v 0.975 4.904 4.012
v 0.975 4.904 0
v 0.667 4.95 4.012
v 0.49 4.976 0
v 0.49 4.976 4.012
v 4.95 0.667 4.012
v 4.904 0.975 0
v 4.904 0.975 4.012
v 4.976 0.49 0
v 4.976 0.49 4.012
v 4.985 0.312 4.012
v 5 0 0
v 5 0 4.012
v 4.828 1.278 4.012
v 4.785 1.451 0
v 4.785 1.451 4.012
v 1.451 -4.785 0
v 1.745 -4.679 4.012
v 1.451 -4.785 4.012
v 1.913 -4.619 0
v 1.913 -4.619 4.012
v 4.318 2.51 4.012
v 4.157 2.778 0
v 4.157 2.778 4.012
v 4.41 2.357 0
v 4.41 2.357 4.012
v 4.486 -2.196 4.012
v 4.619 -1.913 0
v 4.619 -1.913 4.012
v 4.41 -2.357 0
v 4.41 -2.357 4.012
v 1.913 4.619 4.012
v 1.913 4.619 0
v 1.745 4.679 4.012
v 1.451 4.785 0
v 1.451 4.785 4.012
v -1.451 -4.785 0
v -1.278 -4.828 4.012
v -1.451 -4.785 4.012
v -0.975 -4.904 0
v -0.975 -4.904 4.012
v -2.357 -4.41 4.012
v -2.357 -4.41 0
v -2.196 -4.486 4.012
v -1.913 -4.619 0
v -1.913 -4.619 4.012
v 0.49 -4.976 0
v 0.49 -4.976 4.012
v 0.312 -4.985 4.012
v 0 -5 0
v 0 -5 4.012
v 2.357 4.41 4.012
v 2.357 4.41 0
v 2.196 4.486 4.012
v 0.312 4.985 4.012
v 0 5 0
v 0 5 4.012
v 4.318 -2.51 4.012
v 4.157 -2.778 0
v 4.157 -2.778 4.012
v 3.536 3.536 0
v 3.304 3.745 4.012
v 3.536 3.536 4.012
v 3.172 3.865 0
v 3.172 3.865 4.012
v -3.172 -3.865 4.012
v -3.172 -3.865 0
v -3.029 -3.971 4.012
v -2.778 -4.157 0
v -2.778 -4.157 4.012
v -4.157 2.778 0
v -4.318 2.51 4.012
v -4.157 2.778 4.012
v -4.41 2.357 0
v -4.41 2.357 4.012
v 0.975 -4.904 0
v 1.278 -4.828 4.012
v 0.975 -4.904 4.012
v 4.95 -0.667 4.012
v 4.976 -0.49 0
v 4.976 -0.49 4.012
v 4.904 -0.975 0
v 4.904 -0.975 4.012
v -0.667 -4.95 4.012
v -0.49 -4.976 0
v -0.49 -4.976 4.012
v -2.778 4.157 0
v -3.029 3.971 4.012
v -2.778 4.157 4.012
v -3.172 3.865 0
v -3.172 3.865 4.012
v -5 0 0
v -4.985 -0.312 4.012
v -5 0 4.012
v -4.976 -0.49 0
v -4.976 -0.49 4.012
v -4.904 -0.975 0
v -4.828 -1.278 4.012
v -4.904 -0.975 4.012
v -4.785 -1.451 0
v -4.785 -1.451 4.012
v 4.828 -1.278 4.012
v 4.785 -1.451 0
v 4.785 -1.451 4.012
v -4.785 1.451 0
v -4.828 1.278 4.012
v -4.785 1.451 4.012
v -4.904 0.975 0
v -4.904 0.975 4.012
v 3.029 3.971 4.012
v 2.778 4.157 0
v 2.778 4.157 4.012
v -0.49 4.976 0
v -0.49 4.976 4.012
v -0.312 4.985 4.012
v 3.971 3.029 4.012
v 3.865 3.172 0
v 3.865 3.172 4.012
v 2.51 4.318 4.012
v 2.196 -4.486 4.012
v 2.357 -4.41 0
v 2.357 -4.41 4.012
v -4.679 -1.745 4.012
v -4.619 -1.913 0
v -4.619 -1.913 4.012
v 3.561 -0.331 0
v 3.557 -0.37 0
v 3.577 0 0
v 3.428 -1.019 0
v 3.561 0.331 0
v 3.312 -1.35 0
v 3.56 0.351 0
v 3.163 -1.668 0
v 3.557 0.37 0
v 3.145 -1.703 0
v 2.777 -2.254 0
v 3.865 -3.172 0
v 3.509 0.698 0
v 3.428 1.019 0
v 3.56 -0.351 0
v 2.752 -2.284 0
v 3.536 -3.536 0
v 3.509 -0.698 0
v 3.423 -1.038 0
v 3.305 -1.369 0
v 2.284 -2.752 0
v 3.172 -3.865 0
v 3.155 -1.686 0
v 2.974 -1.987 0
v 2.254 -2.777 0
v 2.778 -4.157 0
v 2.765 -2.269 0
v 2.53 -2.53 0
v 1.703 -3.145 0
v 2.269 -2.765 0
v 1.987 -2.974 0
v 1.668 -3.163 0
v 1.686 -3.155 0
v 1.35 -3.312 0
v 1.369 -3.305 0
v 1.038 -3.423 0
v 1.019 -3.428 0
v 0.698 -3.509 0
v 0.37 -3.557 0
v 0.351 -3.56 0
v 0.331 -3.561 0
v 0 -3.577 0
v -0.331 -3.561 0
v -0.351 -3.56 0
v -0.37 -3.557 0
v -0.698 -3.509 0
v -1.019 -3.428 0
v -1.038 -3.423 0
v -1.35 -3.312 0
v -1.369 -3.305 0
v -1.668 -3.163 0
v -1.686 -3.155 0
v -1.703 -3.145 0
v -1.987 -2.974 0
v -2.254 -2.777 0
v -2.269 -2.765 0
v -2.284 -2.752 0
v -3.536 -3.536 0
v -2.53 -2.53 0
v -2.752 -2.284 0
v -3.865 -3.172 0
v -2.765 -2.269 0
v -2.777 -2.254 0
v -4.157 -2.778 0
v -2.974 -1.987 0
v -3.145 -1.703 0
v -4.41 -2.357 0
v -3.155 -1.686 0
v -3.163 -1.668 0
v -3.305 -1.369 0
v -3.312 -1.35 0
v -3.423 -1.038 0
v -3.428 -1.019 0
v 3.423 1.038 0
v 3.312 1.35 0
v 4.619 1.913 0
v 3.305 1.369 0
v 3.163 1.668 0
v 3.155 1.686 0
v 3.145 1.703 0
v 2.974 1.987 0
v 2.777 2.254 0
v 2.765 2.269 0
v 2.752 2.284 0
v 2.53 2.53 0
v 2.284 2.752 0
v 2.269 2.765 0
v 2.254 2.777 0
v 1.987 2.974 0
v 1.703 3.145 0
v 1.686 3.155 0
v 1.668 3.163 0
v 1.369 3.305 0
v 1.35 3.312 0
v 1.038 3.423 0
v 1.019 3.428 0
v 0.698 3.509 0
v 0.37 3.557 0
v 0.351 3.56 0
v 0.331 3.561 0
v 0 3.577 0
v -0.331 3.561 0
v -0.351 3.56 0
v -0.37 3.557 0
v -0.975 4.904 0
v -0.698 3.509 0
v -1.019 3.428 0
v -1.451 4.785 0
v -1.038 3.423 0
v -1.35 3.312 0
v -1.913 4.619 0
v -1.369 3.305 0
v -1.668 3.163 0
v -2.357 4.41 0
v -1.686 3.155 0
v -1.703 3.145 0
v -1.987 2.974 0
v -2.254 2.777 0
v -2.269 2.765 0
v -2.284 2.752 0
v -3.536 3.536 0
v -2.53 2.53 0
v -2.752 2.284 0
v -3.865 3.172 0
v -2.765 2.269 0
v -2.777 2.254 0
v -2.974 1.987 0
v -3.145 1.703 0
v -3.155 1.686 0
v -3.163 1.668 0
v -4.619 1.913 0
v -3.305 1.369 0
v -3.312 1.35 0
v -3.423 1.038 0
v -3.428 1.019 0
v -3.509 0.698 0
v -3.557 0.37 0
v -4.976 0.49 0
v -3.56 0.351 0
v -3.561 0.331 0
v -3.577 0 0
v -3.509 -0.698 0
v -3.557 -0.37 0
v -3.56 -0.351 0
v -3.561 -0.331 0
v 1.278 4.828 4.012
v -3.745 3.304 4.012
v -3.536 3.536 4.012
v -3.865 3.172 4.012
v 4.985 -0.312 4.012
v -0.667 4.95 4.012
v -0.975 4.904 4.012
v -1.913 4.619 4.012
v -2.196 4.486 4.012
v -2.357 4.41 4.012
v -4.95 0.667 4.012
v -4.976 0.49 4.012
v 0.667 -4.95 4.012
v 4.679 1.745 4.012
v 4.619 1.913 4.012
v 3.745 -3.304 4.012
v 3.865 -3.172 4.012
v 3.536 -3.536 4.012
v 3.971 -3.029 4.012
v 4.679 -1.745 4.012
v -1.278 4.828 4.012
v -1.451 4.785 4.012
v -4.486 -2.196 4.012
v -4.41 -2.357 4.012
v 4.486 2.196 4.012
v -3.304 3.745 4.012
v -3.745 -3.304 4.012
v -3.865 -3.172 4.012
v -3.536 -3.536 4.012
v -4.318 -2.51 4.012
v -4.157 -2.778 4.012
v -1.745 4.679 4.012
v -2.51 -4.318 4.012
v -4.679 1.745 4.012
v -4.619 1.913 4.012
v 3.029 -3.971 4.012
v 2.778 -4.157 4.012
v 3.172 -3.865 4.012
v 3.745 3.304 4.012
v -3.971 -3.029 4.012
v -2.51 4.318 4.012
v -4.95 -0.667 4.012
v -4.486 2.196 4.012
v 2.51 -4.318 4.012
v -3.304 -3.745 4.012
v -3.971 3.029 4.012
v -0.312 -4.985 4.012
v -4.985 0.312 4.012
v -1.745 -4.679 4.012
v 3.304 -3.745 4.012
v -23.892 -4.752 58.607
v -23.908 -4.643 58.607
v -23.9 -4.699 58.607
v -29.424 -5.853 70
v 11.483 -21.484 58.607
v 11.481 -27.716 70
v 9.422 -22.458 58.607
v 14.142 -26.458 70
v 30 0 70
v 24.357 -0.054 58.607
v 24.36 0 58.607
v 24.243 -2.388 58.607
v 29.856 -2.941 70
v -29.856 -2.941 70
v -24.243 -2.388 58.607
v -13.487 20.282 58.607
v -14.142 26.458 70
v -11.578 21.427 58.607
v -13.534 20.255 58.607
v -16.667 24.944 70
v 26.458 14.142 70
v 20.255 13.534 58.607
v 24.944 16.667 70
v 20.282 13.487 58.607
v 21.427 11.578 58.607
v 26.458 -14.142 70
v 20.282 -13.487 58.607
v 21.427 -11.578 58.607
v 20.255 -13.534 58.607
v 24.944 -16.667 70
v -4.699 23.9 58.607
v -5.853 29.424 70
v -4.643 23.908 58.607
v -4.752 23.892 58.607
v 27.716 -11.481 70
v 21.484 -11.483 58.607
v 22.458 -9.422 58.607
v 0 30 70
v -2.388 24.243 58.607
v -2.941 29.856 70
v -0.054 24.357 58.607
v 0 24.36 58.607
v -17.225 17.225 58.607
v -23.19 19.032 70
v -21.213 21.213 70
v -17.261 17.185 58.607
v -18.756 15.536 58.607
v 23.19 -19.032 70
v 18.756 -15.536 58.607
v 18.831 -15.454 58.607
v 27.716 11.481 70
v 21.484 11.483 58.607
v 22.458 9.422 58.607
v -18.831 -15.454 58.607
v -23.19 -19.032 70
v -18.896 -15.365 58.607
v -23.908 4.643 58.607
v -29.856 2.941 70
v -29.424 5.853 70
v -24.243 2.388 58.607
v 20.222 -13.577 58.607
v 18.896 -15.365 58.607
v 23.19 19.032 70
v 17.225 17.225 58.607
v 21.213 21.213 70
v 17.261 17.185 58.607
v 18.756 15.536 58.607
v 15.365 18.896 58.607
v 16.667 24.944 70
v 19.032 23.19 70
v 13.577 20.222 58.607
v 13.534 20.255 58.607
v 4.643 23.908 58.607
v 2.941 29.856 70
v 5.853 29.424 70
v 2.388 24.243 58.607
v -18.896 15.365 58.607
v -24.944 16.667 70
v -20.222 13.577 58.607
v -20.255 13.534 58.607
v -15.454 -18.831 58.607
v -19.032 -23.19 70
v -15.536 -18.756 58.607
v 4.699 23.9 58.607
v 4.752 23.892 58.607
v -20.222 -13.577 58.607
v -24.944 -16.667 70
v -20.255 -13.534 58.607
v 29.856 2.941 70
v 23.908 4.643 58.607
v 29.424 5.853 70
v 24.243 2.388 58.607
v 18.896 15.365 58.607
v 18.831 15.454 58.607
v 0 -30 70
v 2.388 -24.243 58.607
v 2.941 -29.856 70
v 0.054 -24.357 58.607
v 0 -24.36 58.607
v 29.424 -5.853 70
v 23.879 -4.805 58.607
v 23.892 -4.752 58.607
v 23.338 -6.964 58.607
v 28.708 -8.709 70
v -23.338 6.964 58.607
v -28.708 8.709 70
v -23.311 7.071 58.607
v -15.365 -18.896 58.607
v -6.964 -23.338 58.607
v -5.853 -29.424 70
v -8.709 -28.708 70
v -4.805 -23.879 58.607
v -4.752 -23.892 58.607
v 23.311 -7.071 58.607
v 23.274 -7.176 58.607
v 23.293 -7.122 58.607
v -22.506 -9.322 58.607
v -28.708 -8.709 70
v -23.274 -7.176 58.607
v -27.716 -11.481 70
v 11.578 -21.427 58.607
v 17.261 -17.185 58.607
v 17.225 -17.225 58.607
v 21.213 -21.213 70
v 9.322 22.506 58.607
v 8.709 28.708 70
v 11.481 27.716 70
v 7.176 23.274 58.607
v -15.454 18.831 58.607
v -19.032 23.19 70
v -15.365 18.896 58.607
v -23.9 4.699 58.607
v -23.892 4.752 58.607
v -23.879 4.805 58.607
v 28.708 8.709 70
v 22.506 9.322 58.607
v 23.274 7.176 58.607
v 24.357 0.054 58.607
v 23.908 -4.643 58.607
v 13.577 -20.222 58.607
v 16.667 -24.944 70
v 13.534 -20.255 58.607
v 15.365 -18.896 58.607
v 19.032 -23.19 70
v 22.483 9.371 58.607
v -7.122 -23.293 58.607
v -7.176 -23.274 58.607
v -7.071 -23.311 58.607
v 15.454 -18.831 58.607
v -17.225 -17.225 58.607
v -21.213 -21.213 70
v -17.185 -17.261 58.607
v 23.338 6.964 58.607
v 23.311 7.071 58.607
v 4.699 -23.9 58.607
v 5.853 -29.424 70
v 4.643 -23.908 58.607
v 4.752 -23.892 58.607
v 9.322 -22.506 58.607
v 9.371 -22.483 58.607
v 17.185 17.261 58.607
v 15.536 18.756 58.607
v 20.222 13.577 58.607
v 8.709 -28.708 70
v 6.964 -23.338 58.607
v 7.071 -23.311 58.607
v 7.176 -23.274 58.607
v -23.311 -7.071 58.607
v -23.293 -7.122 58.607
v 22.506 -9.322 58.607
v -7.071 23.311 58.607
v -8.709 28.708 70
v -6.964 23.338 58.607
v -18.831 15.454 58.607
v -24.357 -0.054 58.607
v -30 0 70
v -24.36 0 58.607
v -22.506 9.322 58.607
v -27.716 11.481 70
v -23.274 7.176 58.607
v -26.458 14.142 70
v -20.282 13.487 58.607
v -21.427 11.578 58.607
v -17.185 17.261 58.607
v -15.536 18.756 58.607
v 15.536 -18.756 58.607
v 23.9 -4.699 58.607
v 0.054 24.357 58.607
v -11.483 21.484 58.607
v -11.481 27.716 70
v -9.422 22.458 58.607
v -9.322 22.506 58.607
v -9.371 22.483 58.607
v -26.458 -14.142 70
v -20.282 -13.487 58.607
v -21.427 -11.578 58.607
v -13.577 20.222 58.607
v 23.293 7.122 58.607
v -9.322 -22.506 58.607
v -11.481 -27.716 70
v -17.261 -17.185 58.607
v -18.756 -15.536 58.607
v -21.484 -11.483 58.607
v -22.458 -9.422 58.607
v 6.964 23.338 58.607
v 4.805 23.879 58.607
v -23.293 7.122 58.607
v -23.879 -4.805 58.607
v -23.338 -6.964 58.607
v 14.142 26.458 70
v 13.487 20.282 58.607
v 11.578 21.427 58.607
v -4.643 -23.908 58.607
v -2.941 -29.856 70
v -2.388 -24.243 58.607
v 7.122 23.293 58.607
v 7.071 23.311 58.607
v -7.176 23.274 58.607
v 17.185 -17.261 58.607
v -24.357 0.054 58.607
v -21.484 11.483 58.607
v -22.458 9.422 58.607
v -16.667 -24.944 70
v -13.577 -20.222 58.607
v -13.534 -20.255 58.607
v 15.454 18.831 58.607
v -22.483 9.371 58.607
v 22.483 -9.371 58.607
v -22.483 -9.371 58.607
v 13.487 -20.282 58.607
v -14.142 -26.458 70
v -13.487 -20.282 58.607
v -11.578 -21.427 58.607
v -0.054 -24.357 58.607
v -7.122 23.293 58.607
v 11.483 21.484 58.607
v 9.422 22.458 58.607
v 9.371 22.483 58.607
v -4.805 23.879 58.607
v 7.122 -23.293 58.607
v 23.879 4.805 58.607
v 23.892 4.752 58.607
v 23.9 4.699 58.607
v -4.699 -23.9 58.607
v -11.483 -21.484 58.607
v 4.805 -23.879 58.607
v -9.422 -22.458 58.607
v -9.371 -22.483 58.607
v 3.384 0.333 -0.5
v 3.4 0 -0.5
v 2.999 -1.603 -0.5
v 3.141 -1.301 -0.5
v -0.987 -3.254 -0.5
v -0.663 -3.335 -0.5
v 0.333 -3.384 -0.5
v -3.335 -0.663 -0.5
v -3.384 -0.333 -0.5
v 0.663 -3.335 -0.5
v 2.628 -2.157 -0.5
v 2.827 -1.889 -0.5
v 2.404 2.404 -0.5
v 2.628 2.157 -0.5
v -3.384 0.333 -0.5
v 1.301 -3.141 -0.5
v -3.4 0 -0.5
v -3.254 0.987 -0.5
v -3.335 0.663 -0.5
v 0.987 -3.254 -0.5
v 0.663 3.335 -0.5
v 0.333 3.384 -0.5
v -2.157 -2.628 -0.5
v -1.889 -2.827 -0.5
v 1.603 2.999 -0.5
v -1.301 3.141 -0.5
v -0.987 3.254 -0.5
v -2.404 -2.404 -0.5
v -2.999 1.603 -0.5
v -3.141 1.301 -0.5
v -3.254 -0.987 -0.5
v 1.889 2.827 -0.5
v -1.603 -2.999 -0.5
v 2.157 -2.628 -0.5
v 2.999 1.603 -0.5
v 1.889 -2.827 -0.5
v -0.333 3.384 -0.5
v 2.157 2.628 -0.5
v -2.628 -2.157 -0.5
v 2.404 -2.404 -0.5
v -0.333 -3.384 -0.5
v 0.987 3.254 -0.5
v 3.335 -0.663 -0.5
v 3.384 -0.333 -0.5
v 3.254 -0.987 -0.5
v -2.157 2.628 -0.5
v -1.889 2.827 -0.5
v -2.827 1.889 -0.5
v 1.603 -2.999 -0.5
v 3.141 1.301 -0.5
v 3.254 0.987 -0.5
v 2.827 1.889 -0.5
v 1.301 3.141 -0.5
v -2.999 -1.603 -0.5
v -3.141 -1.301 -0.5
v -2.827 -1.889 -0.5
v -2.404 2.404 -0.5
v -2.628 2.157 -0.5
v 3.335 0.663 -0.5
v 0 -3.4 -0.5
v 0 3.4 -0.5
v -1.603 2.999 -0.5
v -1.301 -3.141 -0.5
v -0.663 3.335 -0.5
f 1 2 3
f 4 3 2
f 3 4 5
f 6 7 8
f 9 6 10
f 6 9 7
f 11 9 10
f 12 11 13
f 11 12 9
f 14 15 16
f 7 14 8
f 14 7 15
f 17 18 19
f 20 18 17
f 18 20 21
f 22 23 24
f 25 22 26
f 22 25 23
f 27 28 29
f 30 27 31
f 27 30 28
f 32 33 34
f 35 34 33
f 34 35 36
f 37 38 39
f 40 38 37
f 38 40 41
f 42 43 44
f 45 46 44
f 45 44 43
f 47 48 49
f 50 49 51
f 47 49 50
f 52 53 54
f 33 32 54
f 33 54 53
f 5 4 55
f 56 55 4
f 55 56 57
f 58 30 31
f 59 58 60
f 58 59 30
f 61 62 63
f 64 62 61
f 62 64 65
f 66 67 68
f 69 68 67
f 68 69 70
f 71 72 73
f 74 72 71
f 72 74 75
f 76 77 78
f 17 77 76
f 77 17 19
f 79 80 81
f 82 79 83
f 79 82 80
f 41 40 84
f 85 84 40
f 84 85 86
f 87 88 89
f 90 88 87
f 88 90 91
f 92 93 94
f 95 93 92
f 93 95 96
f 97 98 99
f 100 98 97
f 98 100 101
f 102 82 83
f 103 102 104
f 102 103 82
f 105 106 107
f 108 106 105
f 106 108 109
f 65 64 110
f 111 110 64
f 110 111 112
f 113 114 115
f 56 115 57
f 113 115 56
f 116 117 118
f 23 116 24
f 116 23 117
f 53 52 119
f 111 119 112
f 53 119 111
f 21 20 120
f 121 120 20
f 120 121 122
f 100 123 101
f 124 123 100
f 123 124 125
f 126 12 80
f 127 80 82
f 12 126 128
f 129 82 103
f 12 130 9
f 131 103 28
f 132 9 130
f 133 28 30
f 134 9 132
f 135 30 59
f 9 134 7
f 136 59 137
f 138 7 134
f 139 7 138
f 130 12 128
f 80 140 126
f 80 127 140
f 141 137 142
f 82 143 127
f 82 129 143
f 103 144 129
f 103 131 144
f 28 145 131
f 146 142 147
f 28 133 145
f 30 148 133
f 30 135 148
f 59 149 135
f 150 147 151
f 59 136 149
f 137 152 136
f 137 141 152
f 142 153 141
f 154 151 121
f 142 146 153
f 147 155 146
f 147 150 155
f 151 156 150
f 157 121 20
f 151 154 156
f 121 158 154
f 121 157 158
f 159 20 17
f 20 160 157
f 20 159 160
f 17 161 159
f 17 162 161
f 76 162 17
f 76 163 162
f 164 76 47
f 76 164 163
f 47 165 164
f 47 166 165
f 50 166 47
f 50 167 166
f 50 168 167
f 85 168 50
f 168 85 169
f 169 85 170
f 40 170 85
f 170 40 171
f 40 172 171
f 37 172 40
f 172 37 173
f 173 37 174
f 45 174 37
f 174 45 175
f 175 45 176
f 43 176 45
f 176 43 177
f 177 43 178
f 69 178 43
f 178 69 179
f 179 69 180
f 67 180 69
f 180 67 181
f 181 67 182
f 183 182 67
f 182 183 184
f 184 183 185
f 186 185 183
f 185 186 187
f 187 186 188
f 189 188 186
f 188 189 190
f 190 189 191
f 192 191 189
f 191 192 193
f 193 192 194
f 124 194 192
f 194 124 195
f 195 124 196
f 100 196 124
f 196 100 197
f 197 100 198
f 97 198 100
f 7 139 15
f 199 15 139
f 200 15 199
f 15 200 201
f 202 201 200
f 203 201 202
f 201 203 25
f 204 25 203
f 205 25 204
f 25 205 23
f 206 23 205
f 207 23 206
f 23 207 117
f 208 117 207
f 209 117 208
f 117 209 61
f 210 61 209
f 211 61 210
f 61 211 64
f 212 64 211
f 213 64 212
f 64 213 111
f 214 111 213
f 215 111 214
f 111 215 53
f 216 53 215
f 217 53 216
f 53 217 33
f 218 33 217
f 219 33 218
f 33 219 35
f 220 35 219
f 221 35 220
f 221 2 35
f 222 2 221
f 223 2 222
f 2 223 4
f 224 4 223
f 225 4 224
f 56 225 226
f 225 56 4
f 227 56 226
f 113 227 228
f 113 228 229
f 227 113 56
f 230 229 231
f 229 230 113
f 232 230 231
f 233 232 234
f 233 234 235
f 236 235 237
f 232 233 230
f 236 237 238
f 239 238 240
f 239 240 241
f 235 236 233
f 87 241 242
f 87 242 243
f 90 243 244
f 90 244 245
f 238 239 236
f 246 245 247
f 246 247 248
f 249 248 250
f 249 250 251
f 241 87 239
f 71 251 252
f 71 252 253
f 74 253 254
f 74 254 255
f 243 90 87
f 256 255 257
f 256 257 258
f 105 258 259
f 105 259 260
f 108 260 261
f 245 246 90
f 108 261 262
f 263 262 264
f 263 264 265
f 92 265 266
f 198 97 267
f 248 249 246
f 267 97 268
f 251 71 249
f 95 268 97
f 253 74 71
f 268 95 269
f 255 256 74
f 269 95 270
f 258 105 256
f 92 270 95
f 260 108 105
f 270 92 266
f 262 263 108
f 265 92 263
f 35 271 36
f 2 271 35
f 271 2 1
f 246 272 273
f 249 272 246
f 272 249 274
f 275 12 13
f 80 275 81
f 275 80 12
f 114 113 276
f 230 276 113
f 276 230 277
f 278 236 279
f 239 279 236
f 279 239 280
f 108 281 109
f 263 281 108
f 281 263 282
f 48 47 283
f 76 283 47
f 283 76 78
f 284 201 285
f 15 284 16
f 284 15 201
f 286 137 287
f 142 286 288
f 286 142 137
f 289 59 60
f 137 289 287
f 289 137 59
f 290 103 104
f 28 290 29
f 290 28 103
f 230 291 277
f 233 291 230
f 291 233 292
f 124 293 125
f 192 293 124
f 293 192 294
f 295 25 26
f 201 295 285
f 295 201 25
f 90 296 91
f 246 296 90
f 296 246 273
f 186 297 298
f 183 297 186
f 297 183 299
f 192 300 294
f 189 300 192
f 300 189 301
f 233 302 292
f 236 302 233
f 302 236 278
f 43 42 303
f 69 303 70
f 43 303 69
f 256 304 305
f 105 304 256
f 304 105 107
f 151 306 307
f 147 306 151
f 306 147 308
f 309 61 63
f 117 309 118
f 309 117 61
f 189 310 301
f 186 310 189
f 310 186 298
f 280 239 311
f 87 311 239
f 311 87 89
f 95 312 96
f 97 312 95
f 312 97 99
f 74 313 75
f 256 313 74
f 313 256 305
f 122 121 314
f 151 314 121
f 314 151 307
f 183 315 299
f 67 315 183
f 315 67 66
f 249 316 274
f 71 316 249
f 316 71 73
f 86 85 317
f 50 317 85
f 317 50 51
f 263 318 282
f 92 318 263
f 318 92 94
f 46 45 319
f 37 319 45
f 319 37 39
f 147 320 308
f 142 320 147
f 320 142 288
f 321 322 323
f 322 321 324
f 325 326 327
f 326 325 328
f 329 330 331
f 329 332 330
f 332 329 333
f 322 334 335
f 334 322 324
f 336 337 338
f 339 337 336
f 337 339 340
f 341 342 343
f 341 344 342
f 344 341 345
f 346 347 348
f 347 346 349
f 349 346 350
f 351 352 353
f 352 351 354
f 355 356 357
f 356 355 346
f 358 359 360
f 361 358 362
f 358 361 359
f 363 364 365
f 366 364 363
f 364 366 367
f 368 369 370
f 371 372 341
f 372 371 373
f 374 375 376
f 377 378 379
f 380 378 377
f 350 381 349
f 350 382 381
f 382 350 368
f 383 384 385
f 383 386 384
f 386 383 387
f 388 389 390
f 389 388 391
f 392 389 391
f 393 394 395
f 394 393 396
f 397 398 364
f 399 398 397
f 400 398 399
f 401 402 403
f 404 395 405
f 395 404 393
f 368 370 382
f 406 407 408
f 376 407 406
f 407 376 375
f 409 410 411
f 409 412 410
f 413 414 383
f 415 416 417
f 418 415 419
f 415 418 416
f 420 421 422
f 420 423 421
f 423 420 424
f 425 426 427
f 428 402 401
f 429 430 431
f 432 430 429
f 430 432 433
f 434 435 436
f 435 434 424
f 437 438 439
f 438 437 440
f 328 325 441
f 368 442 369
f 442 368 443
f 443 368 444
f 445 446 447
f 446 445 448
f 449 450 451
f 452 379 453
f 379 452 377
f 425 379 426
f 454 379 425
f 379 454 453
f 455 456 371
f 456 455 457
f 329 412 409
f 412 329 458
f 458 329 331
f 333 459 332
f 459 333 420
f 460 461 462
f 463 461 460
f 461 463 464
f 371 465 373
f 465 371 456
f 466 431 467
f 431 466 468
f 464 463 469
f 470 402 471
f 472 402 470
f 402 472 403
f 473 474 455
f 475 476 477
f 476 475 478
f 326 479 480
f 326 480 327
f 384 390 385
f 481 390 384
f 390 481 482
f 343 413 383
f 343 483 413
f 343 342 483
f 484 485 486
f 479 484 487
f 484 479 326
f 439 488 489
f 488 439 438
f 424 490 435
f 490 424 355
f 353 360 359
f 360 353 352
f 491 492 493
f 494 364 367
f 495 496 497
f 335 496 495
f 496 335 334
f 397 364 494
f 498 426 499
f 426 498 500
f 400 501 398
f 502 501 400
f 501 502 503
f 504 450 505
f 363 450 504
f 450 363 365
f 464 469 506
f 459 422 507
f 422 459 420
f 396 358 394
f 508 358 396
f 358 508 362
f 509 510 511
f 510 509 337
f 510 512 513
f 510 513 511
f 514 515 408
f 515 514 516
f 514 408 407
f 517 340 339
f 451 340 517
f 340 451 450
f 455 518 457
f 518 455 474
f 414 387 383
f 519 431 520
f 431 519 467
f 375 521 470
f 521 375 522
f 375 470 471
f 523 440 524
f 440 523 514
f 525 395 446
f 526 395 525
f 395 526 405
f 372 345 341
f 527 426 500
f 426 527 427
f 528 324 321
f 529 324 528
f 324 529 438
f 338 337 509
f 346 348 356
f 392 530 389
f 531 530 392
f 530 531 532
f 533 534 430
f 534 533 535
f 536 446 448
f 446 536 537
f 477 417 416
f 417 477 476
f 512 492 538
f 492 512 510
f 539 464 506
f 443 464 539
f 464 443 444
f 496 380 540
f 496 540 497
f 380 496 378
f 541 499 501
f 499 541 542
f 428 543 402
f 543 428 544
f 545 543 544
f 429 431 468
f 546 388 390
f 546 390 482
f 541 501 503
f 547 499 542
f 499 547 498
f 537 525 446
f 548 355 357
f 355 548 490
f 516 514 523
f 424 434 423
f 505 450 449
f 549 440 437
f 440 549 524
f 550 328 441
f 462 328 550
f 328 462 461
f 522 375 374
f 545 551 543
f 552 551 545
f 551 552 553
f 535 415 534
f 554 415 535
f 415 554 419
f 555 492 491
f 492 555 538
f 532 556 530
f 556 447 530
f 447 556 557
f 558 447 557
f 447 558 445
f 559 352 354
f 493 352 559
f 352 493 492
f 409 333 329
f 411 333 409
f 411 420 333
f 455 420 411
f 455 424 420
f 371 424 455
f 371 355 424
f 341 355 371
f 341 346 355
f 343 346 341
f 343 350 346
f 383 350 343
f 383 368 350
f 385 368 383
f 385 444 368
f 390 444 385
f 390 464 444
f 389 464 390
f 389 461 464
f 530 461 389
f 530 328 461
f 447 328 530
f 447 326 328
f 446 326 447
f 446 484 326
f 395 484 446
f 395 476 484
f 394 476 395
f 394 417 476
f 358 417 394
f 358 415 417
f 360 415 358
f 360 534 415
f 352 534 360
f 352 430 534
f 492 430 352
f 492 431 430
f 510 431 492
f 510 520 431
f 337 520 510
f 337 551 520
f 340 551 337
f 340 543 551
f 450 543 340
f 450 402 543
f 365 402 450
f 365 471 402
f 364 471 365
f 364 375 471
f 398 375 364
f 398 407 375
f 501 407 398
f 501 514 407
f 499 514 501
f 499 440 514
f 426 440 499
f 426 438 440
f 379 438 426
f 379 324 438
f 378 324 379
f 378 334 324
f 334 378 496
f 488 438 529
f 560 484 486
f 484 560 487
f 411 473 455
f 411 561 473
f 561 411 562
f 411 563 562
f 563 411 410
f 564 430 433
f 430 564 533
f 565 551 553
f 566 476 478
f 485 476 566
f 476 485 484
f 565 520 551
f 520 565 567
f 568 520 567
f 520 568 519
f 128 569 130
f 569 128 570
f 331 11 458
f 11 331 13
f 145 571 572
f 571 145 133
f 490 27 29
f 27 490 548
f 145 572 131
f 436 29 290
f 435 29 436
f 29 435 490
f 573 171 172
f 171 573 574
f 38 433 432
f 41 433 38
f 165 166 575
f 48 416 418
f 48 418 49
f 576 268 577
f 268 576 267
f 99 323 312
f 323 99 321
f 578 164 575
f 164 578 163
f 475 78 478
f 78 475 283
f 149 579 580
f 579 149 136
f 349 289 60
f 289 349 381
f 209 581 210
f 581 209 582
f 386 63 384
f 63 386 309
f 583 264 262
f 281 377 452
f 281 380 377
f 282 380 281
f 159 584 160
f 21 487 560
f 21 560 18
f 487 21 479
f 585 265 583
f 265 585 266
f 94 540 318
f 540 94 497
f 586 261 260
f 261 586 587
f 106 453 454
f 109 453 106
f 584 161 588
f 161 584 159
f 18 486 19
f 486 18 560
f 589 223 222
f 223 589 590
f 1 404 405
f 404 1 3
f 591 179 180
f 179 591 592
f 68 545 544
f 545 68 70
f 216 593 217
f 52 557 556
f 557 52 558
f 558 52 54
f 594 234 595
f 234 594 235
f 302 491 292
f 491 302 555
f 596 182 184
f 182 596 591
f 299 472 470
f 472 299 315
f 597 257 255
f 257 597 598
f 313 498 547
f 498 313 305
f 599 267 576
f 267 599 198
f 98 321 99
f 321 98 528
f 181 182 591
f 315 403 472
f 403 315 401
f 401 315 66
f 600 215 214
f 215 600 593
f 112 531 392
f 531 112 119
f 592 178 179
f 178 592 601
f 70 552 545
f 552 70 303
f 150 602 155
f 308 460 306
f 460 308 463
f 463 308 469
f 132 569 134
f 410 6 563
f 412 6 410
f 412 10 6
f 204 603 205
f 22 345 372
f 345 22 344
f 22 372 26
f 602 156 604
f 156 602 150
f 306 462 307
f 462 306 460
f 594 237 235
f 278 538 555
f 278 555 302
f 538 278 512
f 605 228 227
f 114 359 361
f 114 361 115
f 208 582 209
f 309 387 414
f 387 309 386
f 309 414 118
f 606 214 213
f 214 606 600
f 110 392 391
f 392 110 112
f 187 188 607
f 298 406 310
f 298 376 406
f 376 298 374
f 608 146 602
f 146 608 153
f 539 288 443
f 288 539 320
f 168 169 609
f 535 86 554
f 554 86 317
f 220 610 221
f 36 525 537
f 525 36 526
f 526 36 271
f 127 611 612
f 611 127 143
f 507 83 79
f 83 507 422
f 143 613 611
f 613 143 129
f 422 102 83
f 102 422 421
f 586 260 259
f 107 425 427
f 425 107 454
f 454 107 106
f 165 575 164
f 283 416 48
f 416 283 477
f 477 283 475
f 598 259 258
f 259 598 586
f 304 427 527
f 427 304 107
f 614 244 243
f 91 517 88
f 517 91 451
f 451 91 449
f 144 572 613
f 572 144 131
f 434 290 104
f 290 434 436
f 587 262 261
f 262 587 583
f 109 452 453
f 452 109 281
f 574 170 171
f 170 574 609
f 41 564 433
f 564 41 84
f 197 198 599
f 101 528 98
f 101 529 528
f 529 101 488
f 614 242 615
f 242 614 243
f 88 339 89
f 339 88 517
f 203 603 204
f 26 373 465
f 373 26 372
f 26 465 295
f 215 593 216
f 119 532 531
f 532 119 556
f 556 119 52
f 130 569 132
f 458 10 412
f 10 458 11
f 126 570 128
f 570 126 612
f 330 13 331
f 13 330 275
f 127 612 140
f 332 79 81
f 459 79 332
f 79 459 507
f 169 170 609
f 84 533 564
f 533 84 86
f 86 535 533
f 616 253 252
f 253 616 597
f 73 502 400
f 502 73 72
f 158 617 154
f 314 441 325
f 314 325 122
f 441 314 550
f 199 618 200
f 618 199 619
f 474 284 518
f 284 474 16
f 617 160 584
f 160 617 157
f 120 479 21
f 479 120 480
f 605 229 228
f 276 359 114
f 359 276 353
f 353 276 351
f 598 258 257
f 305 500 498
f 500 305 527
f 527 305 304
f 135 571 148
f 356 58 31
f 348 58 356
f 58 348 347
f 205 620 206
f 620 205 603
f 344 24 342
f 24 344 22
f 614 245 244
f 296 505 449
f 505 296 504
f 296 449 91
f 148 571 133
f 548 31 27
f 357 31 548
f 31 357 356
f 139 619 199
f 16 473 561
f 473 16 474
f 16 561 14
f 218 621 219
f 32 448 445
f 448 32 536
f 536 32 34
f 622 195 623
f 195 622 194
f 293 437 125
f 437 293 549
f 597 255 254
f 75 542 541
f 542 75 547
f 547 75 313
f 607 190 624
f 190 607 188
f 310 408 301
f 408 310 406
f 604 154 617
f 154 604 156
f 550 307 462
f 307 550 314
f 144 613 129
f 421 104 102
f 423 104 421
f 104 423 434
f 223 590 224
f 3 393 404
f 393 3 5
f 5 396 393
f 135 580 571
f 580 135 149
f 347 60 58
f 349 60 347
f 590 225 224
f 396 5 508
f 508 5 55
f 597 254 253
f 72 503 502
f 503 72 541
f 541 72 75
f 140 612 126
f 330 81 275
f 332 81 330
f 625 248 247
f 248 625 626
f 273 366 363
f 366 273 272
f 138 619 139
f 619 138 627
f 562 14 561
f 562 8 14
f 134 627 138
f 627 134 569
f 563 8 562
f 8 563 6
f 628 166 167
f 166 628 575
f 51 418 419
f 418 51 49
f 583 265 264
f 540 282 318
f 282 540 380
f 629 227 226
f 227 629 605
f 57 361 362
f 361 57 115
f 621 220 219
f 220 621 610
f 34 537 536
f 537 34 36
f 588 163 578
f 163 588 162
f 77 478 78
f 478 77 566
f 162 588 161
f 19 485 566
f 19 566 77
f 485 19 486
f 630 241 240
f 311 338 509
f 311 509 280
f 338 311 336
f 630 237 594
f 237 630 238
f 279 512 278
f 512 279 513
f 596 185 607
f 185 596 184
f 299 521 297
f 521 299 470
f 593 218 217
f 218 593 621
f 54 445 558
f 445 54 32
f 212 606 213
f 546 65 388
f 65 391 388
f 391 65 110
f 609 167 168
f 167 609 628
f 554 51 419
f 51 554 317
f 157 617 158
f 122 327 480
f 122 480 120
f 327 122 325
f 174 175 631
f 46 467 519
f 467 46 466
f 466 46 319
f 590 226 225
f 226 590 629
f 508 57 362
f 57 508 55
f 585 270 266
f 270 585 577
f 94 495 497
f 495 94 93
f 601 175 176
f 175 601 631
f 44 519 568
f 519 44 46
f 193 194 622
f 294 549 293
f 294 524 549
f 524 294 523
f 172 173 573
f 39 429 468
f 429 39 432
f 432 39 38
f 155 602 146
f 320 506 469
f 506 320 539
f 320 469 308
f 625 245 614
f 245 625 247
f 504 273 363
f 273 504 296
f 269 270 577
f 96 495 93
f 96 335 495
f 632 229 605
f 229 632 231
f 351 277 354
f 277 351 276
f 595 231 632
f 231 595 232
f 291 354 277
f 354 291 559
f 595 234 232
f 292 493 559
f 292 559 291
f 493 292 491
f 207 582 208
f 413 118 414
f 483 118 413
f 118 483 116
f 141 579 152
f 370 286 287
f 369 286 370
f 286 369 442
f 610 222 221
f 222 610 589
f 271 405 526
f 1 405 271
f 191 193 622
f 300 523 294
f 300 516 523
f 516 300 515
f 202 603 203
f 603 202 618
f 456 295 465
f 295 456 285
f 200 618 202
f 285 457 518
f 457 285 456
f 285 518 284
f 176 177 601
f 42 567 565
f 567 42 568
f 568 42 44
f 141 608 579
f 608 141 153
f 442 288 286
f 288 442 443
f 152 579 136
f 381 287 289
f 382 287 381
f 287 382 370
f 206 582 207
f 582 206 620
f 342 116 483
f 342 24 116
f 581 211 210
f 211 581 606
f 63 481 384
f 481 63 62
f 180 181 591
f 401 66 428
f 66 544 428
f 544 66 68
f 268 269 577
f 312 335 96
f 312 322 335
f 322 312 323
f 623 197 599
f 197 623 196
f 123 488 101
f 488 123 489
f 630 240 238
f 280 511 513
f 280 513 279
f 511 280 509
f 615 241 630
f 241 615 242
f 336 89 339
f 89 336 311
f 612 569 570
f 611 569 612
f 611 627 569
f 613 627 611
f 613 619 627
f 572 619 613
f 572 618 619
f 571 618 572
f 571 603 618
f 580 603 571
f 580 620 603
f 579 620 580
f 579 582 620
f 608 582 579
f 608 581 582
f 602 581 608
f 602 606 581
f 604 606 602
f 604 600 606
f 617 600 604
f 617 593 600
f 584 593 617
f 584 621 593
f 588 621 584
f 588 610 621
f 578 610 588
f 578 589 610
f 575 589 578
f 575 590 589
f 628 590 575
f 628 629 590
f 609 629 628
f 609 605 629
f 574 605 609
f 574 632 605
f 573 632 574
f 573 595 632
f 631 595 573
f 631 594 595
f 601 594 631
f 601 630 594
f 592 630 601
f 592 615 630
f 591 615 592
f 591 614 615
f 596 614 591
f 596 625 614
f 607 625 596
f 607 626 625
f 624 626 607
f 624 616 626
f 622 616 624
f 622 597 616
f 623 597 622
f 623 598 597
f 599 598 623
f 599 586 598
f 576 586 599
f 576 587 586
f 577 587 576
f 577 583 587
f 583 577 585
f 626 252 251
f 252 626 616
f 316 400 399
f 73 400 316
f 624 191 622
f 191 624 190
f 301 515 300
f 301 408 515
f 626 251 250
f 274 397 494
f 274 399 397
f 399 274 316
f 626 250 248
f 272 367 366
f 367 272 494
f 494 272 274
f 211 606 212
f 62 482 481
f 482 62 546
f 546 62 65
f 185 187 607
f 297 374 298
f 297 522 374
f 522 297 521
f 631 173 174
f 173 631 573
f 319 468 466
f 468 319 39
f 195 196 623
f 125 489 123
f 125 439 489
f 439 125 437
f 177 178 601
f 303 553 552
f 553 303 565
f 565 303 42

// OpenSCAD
// Small lab funnel, printed upright with wide opening at top
// Units: mm

$fn = 64;

// --- Dimensions ---
spout_od      = 10;    // spout outer diameter
spout_id      = spout_od - 2 * 1.6;  // spout bore (6.8)
spout_h       = 20;    // spout height (z = 0 to 20)
cone_top_d    = 10;    // cone diameter at spout junction (z = 20)
cone_rim_d    = 60;    // cone rim diameter (z = 50)
cone_h        = cone_rim_d - cone_top_d; // cone height (30)
wall          = 1.6;   // uniform wall thickness
eps           = 0.5;   // overlap / cut overshoot

// --- Model ---
union() {
    // Spout
    translate([0, 0, 0])
        cylinder(d = spout_od, h = spout_h);
    // Cone (overlaps spout by eps for a clean union)
    translate([0, 0, spout_h - eps])
        cylinder(d1 = cone_top_d, d2 = cone_rim_d, h = cone_h + eps);
}
difference() {
    // Through-bore: spout bore up to junction, then cone wall thickness
    translate([0, 0, -eps])
        cylinder(d1 = spout_id,
                 d2 = cone_rim_d - 2 * wall,
                 h = spout_h + cone_h + eps);
    // Open rim at top
    translate([0, 0, spout_h + cone_h - eps])
        cylinder(d = cone_rim_d + 2 * eps, h = eps);
}
